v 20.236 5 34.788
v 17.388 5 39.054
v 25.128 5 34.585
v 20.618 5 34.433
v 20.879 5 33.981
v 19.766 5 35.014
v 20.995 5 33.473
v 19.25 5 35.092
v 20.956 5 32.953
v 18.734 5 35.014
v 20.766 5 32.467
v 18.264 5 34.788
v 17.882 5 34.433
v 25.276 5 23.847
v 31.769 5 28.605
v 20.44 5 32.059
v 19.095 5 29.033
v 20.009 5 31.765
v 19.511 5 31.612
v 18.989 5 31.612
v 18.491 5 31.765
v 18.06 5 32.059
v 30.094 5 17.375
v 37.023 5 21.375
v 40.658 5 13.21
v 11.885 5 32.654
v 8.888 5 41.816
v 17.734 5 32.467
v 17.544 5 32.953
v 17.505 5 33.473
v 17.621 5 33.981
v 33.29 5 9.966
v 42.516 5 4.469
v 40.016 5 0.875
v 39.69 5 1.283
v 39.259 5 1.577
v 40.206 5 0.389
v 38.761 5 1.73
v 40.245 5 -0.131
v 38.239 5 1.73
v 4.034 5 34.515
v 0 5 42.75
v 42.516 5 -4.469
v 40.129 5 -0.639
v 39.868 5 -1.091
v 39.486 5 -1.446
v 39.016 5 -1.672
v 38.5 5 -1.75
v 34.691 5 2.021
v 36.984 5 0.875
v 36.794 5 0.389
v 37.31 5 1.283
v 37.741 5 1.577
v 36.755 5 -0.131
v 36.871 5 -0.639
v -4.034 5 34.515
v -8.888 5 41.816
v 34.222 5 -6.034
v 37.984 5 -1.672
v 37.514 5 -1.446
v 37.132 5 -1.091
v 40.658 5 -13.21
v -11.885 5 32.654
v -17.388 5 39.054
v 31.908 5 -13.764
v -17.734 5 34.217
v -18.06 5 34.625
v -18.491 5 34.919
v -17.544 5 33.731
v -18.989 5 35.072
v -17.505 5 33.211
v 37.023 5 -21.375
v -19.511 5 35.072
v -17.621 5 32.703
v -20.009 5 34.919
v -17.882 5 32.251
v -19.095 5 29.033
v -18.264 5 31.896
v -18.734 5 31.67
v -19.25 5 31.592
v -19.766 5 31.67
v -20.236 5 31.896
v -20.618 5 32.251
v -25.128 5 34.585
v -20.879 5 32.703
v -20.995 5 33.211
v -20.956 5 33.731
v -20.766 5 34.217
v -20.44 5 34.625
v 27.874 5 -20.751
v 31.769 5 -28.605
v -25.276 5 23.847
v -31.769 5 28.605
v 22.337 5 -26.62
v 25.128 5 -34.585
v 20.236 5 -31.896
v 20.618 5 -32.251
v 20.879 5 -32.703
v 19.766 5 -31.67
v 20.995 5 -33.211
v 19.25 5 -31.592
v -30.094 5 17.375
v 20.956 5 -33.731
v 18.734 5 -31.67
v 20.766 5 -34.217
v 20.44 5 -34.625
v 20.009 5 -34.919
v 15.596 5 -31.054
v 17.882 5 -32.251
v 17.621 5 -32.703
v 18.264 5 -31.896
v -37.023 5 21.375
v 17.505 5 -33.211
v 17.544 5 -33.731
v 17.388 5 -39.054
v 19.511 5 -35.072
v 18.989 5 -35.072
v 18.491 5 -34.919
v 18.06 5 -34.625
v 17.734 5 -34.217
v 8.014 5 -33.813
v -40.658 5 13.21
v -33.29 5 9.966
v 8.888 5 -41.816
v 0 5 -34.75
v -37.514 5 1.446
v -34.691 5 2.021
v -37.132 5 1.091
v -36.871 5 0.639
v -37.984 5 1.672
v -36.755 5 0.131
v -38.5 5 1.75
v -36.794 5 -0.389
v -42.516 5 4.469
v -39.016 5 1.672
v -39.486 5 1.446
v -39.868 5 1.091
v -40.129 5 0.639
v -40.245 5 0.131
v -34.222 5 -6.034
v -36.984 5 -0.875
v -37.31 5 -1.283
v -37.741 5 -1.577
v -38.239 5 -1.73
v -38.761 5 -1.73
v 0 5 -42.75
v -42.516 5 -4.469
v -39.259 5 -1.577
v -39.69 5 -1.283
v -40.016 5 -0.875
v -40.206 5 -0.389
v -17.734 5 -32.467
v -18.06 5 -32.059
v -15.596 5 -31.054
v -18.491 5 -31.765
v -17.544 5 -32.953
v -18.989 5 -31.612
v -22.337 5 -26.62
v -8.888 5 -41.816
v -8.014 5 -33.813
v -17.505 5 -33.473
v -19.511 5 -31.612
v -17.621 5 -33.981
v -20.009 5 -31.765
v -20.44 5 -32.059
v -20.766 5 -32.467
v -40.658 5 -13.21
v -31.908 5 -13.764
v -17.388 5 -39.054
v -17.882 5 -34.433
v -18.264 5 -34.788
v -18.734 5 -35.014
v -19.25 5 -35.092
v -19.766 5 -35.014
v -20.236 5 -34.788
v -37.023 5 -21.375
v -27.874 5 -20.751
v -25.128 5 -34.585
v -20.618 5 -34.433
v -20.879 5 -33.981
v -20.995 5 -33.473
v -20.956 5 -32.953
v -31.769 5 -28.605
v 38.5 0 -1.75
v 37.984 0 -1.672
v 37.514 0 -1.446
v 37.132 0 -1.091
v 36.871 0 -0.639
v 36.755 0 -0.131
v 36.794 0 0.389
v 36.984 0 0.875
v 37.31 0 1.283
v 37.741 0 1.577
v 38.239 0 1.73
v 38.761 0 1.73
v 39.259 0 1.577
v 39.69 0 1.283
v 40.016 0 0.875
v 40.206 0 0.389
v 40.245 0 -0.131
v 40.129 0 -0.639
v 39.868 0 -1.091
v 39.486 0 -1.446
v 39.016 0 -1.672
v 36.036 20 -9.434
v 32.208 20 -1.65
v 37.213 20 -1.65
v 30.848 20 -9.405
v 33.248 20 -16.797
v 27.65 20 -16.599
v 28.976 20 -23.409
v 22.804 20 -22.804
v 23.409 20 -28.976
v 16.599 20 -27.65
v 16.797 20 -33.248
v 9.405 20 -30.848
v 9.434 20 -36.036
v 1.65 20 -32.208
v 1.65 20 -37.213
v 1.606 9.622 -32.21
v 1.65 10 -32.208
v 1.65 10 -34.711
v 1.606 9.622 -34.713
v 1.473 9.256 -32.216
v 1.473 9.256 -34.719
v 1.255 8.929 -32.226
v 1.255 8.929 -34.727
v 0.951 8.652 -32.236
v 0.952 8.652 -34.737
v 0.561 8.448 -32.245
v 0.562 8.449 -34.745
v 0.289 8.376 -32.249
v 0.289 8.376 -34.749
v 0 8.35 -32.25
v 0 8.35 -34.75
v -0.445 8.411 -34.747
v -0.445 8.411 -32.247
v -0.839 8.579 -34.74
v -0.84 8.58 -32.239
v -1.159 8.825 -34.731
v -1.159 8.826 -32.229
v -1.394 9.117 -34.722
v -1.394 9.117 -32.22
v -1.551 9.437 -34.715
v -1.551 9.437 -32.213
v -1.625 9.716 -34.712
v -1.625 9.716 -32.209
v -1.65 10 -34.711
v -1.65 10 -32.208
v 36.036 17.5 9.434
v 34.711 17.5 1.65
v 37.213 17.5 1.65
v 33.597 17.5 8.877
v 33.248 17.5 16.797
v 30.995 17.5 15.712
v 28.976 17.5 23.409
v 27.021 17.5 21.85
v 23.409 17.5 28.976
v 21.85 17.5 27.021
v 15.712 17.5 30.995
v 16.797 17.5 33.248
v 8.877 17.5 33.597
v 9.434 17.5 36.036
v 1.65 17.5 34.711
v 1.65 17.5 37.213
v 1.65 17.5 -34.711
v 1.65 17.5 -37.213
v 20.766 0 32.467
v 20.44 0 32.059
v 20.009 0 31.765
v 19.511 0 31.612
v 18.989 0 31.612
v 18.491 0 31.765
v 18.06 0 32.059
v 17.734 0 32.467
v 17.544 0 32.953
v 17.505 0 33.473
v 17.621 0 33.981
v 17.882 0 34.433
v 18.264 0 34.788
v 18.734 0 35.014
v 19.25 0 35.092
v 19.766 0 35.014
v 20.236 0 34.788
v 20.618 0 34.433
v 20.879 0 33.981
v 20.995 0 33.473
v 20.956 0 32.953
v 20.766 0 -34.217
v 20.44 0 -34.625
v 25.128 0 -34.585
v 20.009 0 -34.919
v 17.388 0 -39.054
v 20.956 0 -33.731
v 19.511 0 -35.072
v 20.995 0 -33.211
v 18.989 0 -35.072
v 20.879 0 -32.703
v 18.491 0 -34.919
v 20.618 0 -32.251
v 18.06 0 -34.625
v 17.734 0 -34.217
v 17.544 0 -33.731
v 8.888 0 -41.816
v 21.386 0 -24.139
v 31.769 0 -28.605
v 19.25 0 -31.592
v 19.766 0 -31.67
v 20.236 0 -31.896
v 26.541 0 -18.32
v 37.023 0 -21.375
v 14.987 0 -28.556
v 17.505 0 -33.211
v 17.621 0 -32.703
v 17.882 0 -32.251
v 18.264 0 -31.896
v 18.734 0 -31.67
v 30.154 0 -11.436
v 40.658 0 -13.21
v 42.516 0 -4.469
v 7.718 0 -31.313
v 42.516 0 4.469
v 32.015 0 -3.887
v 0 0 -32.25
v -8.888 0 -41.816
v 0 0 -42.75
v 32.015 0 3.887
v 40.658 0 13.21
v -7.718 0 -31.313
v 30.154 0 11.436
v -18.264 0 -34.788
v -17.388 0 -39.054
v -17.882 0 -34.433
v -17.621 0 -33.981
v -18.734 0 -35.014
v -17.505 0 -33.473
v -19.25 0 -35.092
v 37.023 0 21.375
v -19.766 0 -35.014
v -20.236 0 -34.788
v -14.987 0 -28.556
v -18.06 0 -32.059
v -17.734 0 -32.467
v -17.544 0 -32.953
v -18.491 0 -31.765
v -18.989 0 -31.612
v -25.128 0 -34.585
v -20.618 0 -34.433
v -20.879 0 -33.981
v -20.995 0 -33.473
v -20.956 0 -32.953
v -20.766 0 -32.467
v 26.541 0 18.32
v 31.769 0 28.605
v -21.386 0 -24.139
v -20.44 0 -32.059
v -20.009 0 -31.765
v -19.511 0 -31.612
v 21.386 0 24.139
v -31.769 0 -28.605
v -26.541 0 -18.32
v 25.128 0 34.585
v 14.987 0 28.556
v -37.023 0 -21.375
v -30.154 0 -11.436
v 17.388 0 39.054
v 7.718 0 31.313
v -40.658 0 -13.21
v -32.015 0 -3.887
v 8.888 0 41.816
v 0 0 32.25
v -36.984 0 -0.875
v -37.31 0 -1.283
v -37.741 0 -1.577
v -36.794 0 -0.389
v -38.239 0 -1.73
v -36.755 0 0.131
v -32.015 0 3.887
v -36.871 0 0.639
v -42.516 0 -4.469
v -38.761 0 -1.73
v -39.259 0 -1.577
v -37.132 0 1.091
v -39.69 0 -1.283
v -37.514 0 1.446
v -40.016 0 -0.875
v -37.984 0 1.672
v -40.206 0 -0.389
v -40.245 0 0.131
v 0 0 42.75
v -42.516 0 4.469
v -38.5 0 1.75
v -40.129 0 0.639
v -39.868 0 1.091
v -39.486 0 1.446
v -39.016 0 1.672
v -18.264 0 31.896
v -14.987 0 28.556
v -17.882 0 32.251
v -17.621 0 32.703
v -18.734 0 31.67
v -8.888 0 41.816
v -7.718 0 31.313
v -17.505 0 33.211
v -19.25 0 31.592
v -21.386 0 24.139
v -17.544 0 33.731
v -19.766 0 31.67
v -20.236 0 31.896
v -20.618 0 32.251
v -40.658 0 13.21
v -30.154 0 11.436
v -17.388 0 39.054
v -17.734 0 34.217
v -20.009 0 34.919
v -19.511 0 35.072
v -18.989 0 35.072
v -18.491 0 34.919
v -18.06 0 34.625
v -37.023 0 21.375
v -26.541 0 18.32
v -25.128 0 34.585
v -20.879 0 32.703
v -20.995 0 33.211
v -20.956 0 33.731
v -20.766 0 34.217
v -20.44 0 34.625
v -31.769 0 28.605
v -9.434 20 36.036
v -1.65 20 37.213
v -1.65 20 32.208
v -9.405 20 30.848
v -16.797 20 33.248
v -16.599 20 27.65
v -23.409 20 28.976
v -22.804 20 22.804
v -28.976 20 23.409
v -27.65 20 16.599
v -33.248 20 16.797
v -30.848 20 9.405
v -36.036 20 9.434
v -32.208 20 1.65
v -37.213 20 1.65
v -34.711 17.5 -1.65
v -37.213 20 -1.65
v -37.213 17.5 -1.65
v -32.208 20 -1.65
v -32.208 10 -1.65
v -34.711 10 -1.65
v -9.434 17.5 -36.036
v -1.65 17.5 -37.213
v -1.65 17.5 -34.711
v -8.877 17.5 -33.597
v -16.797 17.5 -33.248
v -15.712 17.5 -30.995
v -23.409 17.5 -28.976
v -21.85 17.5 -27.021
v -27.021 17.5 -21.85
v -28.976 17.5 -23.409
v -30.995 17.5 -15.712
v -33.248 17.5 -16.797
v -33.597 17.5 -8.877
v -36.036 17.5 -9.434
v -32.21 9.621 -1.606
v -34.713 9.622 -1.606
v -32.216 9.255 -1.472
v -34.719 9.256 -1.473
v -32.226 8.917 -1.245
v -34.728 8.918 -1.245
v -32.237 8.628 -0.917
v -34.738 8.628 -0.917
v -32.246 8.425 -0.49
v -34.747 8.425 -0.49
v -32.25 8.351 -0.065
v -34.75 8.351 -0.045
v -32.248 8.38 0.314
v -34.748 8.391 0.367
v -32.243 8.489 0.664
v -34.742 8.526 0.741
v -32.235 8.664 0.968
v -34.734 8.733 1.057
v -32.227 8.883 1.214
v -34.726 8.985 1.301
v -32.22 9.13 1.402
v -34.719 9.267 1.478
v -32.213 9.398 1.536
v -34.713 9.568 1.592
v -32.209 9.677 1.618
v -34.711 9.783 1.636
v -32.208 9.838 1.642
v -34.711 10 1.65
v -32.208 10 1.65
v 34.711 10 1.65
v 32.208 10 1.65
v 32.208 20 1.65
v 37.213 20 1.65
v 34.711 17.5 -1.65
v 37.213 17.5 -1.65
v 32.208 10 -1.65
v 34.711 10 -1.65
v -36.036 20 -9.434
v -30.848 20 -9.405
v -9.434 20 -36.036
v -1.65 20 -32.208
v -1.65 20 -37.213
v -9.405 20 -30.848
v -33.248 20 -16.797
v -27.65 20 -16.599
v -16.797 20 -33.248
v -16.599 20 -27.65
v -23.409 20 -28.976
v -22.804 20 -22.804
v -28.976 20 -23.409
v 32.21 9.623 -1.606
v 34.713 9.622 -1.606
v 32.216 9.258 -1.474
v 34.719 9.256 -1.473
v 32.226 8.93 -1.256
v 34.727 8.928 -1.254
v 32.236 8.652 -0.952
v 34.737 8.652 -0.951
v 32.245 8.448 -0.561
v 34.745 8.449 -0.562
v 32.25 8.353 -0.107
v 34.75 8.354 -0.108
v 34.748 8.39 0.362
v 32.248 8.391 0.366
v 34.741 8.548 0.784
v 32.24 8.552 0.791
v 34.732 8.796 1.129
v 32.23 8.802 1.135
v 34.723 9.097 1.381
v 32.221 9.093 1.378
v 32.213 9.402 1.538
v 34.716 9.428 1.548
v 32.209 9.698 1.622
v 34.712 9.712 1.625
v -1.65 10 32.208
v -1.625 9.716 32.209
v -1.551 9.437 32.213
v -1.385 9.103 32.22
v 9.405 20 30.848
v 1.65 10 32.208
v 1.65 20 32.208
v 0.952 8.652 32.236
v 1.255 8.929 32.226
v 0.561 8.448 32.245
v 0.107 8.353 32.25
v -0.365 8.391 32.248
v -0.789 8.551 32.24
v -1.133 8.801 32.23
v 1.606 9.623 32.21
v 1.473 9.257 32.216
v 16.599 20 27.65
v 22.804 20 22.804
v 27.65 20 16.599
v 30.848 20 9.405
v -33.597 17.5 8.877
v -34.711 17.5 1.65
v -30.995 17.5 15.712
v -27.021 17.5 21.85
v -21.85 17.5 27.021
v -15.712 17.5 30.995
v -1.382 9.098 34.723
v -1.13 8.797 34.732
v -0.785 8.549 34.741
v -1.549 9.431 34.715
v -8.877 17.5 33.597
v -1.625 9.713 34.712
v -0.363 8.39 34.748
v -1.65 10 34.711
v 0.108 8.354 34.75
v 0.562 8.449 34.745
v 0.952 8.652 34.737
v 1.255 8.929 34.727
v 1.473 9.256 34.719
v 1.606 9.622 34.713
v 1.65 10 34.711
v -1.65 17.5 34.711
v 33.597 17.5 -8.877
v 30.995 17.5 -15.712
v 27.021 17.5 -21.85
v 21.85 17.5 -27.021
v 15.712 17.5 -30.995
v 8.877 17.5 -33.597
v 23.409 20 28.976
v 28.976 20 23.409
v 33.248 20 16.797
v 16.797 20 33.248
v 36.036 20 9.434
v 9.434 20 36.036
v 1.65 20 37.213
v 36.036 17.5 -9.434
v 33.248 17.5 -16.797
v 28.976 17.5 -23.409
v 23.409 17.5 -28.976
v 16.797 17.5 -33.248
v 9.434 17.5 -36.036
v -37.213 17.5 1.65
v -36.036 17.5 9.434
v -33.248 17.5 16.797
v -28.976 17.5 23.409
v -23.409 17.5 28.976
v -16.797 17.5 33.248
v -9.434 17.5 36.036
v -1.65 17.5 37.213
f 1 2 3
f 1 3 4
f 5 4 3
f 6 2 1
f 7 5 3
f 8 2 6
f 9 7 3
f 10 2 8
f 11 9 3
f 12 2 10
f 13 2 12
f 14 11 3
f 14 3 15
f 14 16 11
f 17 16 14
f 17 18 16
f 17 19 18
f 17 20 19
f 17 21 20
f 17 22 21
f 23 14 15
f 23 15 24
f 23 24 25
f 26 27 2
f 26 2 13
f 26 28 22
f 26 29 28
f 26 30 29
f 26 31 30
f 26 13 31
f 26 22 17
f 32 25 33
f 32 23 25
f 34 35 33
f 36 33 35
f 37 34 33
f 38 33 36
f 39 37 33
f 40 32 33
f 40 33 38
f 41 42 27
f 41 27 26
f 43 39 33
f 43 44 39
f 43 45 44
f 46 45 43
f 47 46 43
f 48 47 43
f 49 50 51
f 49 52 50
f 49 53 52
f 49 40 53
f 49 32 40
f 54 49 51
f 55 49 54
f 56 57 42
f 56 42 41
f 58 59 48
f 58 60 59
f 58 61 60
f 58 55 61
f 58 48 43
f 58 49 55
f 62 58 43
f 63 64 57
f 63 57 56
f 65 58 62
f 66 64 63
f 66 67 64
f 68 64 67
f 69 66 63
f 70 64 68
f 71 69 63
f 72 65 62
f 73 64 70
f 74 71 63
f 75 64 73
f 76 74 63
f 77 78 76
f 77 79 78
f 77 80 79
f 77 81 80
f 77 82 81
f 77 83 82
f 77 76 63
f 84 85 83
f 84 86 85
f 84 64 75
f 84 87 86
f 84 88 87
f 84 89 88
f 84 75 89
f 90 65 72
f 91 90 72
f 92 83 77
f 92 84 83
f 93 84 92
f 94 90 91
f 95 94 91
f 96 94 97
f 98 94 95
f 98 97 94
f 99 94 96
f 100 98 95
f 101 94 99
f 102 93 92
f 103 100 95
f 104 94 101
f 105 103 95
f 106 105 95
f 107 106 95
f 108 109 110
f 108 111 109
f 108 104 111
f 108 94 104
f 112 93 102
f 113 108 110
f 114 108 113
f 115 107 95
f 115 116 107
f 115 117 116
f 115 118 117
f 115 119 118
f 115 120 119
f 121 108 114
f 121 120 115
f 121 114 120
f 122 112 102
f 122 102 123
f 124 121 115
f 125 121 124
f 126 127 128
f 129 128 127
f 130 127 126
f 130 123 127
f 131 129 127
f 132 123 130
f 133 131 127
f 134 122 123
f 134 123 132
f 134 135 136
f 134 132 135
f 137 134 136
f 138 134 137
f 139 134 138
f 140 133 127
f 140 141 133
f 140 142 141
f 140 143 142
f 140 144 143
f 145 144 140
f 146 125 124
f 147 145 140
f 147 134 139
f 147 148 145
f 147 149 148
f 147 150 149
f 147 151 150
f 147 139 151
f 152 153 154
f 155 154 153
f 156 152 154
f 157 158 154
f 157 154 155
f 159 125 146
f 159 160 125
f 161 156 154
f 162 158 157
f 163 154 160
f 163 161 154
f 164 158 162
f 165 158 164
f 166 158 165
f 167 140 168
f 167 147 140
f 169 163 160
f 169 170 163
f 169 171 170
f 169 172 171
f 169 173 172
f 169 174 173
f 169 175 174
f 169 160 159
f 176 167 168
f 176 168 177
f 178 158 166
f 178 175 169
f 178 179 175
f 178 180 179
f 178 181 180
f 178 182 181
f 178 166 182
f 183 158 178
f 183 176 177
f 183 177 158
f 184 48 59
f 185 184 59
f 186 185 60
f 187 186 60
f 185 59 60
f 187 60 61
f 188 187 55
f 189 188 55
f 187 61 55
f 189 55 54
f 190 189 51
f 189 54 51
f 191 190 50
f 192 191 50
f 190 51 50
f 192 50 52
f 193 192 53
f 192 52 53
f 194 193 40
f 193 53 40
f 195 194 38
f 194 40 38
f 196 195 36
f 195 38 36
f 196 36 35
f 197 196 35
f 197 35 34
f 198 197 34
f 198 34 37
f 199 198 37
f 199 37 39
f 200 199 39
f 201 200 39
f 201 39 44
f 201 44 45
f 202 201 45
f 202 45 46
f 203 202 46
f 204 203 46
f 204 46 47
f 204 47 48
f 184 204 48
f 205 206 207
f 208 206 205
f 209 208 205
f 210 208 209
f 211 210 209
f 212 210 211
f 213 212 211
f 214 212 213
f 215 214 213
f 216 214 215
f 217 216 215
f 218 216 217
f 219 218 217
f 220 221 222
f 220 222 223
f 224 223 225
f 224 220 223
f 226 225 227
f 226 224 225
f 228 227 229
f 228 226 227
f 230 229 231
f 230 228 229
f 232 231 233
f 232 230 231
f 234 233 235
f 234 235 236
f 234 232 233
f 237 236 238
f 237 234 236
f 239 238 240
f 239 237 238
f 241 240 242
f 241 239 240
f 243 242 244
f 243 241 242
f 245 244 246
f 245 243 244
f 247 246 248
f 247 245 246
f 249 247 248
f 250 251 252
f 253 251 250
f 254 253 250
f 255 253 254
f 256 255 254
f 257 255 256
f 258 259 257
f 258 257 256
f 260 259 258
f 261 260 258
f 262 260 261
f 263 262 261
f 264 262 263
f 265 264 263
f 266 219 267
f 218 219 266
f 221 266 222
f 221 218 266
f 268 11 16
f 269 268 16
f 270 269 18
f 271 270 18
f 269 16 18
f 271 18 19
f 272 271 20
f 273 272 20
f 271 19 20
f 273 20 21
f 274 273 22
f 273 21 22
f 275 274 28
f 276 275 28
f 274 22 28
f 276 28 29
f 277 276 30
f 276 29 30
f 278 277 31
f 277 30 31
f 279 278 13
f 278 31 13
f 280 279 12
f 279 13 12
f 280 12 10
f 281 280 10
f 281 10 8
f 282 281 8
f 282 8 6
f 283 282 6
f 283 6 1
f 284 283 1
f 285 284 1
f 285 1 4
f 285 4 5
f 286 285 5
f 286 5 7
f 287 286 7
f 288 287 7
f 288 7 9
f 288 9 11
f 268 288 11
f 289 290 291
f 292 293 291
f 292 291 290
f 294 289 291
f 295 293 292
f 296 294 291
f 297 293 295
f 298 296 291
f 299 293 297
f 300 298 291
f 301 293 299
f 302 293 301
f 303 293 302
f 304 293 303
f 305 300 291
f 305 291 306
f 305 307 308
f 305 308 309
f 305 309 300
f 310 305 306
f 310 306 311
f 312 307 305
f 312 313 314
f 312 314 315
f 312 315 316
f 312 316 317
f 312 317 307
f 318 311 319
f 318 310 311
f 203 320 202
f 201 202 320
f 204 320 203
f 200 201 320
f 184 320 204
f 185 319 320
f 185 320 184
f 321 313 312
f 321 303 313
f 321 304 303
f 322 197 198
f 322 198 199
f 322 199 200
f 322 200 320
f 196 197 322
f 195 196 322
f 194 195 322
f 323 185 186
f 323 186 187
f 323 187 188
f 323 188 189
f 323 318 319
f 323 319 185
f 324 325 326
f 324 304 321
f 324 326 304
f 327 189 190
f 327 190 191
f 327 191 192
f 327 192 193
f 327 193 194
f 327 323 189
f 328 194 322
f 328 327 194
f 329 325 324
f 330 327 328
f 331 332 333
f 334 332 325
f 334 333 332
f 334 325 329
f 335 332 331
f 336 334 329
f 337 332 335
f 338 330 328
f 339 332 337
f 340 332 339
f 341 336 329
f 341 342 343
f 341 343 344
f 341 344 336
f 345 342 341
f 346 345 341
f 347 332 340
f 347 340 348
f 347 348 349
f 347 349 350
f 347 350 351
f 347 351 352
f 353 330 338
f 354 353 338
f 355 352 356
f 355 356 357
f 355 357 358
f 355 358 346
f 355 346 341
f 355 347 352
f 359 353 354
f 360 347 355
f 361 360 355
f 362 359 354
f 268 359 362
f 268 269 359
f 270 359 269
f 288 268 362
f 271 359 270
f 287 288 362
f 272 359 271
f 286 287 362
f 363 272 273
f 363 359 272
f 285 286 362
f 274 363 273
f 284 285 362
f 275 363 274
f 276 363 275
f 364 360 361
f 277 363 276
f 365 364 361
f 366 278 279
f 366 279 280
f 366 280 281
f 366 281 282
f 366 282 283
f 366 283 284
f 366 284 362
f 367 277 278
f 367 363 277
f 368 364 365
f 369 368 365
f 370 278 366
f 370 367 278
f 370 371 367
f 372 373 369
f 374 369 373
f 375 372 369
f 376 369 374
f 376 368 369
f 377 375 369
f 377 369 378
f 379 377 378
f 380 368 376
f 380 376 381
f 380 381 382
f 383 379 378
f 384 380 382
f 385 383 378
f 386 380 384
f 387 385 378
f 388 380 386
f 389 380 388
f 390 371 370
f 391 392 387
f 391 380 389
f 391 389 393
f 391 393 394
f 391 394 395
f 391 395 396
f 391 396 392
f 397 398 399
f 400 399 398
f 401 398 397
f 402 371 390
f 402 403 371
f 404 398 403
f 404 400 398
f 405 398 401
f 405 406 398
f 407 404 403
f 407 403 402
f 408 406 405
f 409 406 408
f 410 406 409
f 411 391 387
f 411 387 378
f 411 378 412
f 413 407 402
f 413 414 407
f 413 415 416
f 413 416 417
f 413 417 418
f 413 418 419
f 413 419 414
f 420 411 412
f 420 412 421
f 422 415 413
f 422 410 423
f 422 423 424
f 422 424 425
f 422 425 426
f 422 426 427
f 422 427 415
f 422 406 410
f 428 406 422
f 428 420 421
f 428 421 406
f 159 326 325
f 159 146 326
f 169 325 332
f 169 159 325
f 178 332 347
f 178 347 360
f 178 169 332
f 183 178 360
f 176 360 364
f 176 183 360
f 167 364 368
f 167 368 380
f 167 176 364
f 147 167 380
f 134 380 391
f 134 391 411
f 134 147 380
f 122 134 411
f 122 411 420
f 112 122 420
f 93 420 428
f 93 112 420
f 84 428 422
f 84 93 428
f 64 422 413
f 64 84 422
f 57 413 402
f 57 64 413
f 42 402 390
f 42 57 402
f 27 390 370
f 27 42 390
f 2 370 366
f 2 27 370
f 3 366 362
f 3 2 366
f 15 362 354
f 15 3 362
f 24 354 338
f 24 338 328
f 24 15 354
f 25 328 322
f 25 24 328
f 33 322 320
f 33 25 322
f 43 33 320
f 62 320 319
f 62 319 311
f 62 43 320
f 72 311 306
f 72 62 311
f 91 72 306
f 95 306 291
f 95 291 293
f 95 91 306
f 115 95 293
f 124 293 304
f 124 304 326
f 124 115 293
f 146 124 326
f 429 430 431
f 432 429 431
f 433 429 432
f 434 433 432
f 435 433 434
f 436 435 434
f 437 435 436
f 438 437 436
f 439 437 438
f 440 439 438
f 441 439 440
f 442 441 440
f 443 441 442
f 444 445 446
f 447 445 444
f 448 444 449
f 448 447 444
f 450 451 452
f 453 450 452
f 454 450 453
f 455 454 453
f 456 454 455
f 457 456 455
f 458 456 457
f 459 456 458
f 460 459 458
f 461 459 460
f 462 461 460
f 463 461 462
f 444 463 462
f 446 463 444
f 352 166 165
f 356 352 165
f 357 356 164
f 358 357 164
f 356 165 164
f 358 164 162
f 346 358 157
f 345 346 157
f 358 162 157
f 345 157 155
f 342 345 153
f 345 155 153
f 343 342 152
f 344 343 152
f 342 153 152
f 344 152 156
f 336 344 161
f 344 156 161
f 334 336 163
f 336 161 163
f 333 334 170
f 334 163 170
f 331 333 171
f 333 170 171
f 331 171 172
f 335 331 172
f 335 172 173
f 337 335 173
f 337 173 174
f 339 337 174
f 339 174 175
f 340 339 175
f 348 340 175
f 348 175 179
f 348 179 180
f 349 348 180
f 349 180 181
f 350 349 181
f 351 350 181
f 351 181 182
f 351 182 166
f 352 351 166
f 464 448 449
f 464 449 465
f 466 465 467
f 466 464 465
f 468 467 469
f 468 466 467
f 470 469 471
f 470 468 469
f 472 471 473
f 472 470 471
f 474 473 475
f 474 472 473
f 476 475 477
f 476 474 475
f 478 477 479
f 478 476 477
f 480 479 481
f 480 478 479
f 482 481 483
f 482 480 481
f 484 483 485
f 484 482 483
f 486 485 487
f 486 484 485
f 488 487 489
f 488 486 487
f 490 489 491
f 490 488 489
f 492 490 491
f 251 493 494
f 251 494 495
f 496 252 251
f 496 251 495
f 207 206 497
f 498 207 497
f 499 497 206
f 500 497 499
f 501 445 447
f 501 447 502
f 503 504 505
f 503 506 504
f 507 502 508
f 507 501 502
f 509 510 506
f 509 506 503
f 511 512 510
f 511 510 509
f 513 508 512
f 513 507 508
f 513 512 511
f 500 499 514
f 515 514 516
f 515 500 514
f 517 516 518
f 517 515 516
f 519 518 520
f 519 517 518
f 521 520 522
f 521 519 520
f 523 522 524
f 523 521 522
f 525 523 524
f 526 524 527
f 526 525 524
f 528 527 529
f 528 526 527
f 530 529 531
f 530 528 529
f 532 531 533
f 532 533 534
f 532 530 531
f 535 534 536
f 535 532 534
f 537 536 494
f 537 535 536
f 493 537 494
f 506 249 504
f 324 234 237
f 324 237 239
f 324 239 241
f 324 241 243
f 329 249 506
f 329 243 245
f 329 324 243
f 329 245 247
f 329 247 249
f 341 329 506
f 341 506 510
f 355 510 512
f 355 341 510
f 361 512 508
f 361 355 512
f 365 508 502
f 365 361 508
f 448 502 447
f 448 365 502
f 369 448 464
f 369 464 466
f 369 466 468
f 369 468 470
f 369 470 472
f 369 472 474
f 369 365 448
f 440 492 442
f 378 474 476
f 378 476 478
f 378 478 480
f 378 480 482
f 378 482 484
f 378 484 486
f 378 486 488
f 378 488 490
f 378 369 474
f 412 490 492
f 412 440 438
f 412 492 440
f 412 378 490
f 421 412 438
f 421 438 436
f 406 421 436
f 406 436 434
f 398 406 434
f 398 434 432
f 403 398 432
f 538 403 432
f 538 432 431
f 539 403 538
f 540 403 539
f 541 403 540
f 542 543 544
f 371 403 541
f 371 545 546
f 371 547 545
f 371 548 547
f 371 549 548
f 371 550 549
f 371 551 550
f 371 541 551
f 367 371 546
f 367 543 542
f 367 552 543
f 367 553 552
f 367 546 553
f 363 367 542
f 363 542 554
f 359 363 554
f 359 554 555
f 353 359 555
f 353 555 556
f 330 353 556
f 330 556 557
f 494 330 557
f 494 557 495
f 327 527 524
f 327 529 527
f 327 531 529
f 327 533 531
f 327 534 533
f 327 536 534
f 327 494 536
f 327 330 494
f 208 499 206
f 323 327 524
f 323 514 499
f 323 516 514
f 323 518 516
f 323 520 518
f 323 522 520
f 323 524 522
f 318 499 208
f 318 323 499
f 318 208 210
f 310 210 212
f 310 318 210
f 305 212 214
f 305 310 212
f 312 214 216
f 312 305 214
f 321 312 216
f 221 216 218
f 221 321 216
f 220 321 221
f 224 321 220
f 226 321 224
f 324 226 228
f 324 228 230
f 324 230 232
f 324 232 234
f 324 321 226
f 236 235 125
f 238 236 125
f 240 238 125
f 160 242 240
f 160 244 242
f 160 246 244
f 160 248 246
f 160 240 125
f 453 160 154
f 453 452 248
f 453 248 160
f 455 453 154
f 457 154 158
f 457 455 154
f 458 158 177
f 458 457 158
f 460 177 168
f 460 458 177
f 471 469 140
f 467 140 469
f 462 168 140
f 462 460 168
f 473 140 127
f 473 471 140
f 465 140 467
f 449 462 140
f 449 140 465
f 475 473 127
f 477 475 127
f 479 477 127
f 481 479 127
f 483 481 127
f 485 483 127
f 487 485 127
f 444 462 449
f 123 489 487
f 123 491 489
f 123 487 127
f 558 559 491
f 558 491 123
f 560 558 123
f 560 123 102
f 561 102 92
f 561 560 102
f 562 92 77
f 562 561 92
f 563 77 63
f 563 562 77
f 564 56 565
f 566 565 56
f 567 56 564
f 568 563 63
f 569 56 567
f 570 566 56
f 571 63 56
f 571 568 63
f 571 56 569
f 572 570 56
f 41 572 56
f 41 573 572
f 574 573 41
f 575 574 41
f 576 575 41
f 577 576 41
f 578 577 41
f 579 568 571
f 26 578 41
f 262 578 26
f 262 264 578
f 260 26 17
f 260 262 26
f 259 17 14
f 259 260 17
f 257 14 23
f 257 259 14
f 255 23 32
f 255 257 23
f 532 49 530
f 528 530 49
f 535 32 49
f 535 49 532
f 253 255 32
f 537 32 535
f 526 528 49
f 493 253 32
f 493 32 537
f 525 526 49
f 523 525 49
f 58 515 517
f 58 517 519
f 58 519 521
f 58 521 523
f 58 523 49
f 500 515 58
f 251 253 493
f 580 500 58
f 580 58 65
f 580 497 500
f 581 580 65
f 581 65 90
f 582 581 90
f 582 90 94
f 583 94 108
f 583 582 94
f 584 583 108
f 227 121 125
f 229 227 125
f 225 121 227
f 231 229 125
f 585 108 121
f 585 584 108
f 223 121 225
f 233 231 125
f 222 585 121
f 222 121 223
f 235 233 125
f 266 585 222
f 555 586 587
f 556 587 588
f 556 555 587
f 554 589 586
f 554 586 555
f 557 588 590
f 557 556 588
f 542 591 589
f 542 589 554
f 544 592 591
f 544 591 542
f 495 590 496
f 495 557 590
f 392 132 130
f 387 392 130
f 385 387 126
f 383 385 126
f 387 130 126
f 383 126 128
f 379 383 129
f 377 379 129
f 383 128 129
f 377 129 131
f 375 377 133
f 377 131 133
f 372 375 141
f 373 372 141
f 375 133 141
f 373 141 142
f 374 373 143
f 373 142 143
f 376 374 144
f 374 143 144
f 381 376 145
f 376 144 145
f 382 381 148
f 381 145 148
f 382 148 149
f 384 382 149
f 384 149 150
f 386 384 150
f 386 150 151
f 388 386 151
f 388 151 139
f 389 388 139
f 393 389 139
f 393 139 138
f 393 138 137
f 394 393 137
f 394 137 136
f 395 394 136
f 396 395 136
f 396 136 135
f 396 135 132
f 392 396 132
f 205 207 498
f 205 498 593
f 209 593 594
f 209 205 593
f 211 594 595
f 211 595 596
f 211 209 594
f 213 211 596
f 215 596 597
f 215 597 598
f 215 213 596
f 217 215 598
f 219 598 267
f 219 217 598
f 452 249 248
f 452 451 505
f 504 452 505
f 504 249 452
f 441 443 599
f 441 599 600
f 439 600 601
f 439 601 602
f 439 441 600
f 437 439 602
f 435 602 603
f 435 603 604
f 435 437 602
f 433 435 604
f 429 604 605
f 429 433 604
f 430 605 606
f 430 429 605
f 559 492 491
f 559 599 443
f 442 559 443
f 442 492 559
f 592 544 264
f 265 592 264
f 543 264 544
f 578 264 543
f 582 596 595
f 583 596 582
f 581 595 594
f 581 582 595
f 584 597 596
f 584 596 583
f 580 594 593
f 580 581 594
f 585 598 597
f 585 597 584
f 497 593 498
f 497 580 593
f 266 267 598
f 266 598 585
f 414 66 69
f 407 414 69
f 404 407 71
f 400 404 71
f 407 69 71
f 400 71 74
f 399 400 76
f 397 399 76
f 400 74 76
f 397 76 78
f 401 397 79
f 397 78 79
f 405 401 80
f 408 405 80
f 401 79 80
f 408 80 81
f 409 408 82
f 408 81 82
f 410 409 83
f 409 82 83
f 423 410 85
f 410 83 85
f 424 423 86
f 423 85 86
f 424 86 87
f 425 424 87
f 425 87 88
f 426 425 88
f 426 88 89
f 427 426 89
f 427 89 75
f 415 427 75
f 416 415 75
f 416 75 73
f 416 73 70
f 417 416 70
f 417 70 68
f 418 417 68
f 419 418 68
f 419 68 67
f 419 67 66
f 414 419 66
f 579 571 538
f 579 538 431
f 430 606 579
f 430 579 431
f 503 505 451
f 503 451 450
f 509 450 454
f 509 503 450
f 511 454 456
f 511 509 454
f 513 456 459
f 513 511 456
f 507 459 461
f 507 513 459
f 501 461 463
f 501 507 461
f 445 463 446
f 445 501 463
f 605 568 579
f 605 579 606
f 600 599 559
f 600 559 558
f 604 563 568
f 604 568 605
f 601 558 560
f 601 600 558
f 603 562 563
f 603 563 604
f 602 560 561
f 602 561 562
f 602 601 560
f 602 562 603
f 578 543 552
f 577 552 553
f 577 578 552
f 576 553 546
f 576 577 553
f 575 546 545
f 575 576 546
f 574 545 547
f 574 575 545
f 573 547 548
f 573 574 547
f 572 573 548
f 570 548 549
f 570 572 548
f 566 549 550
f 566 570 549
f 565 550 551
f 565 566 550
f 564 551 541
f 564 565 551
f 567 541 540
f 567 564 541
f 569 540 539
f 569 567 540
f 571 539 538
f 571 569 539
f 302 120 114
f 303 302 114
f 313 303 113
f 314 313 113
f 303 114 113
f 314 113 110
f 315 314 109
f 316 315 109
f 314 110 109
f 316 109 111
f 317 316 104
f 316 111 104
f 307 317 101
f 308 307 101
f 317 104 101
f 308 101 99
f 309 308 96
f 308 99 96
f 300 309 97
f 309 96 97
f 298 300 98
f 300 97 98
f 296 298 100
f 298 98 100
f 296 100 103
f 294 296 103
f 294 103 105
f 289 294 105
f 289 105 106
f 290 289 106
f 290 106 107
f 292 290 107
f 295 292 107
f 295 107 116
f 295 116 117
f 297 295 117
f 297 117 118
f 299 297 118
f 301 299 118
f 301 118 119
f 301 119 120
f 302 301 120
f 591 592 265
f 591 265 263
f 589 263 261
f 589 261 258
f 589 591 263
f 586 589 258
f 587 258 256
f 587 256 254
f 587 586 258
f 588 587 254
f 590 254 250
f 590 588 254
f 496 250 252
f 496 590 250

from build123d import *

# Parameters (mm, degrees)
CUT_EXTRUDE1_DEPTH = 64.679863379
CIRPATTERN1_COUNT  = 4
SKETCH4_R          = 1.75
CUT_EXTRUDE2_DEPTH = 10
CIRPATTERN2_COUNT  = 6


with BuildPart() as part:
    # Sketch2 → Revolve1 (revolve)
    with BuildSketch(Plane.XY, mode=Mode.PRIVATE) as revolve1_sk:
        Polygon((-32.25, 20), (-32.25, 0), (-42.75, 0), (-42.75, 5), (-34.75, 5), (-34.75, 17.5), (-37.25, 17.5), (-37.25, 20), align=None)
    revolve(revolve1_sk.sketch.rotate(Axis((0, 0, 0), (0, 1, 0)), 270), axis=Axis((0, 0, 0), (0, 1, 0)))

    # Sketch3 → Cut-Extrude1 (cut, symmetric)
    with BuildSketch(Plane(origin=(0, 0, 0), x_dir=(0, 0, -1), z_dir=(1, 0, 0))):
        with BuildLine():
            Line((-1.65, 29.999999659), (1.65, 29.999999659))
            Line((1.65, 29.999999659), (1.65, 10.000000341))
            ThreePointArc((1.65, 10.000000341), (0, 8.35), (-1.65, 10.000000341))
            Line((-1.65, 10.000000341), (-1.65, 29.999999659))
        make_face()
    cut_extrude1 = extrude(amount=CUT_EXTRUDE1_DEPTH, both=True, mode=Mode.SUBTRACT)

    # CirPattern1: Cut-Extrude1 ×4 about axis
    cirpattern1_axis = Axis((0, 0, 0), (0, -1, 0))
    for i in range(1, CIRPATTERN1_COUNT):
        add(cut_extrude1.rotate(cirpattern1_axis, i * 360 / CIRPATTERN1_COUNT), mode=Mode.SUBTRACT)

    # Sketch4 → Cut-Extrude2 (cut)
    with BuildSketch(Plane(origin=(0, 5, 0), x_dir=(1, 0, 0), z_dir=(0, 1, 0))):
        with Locations(Location((-38.5, 0, 0), (0, 0, 270))):
            Circle(SKETCH4_R)
    cut_extrude2 = extrude(amount=-CUT_EXTRUDE2_DEPTH, mode=Mode.SUBTRACT)

    # CirPattern2: Cut-Extrude2 ×6 about axis
    cirpattern2_axis = Axis((0, 0, 0), (0, 1, 0))
    for i in range(1, CIRPATTERN2_COUNT):
        add(cut_extrude2.rotate(cirpattern2_axis, i * 360 / CIRPATTERN2_COUNT), mode=Mode.SUBTRACT)


solid = part.part
